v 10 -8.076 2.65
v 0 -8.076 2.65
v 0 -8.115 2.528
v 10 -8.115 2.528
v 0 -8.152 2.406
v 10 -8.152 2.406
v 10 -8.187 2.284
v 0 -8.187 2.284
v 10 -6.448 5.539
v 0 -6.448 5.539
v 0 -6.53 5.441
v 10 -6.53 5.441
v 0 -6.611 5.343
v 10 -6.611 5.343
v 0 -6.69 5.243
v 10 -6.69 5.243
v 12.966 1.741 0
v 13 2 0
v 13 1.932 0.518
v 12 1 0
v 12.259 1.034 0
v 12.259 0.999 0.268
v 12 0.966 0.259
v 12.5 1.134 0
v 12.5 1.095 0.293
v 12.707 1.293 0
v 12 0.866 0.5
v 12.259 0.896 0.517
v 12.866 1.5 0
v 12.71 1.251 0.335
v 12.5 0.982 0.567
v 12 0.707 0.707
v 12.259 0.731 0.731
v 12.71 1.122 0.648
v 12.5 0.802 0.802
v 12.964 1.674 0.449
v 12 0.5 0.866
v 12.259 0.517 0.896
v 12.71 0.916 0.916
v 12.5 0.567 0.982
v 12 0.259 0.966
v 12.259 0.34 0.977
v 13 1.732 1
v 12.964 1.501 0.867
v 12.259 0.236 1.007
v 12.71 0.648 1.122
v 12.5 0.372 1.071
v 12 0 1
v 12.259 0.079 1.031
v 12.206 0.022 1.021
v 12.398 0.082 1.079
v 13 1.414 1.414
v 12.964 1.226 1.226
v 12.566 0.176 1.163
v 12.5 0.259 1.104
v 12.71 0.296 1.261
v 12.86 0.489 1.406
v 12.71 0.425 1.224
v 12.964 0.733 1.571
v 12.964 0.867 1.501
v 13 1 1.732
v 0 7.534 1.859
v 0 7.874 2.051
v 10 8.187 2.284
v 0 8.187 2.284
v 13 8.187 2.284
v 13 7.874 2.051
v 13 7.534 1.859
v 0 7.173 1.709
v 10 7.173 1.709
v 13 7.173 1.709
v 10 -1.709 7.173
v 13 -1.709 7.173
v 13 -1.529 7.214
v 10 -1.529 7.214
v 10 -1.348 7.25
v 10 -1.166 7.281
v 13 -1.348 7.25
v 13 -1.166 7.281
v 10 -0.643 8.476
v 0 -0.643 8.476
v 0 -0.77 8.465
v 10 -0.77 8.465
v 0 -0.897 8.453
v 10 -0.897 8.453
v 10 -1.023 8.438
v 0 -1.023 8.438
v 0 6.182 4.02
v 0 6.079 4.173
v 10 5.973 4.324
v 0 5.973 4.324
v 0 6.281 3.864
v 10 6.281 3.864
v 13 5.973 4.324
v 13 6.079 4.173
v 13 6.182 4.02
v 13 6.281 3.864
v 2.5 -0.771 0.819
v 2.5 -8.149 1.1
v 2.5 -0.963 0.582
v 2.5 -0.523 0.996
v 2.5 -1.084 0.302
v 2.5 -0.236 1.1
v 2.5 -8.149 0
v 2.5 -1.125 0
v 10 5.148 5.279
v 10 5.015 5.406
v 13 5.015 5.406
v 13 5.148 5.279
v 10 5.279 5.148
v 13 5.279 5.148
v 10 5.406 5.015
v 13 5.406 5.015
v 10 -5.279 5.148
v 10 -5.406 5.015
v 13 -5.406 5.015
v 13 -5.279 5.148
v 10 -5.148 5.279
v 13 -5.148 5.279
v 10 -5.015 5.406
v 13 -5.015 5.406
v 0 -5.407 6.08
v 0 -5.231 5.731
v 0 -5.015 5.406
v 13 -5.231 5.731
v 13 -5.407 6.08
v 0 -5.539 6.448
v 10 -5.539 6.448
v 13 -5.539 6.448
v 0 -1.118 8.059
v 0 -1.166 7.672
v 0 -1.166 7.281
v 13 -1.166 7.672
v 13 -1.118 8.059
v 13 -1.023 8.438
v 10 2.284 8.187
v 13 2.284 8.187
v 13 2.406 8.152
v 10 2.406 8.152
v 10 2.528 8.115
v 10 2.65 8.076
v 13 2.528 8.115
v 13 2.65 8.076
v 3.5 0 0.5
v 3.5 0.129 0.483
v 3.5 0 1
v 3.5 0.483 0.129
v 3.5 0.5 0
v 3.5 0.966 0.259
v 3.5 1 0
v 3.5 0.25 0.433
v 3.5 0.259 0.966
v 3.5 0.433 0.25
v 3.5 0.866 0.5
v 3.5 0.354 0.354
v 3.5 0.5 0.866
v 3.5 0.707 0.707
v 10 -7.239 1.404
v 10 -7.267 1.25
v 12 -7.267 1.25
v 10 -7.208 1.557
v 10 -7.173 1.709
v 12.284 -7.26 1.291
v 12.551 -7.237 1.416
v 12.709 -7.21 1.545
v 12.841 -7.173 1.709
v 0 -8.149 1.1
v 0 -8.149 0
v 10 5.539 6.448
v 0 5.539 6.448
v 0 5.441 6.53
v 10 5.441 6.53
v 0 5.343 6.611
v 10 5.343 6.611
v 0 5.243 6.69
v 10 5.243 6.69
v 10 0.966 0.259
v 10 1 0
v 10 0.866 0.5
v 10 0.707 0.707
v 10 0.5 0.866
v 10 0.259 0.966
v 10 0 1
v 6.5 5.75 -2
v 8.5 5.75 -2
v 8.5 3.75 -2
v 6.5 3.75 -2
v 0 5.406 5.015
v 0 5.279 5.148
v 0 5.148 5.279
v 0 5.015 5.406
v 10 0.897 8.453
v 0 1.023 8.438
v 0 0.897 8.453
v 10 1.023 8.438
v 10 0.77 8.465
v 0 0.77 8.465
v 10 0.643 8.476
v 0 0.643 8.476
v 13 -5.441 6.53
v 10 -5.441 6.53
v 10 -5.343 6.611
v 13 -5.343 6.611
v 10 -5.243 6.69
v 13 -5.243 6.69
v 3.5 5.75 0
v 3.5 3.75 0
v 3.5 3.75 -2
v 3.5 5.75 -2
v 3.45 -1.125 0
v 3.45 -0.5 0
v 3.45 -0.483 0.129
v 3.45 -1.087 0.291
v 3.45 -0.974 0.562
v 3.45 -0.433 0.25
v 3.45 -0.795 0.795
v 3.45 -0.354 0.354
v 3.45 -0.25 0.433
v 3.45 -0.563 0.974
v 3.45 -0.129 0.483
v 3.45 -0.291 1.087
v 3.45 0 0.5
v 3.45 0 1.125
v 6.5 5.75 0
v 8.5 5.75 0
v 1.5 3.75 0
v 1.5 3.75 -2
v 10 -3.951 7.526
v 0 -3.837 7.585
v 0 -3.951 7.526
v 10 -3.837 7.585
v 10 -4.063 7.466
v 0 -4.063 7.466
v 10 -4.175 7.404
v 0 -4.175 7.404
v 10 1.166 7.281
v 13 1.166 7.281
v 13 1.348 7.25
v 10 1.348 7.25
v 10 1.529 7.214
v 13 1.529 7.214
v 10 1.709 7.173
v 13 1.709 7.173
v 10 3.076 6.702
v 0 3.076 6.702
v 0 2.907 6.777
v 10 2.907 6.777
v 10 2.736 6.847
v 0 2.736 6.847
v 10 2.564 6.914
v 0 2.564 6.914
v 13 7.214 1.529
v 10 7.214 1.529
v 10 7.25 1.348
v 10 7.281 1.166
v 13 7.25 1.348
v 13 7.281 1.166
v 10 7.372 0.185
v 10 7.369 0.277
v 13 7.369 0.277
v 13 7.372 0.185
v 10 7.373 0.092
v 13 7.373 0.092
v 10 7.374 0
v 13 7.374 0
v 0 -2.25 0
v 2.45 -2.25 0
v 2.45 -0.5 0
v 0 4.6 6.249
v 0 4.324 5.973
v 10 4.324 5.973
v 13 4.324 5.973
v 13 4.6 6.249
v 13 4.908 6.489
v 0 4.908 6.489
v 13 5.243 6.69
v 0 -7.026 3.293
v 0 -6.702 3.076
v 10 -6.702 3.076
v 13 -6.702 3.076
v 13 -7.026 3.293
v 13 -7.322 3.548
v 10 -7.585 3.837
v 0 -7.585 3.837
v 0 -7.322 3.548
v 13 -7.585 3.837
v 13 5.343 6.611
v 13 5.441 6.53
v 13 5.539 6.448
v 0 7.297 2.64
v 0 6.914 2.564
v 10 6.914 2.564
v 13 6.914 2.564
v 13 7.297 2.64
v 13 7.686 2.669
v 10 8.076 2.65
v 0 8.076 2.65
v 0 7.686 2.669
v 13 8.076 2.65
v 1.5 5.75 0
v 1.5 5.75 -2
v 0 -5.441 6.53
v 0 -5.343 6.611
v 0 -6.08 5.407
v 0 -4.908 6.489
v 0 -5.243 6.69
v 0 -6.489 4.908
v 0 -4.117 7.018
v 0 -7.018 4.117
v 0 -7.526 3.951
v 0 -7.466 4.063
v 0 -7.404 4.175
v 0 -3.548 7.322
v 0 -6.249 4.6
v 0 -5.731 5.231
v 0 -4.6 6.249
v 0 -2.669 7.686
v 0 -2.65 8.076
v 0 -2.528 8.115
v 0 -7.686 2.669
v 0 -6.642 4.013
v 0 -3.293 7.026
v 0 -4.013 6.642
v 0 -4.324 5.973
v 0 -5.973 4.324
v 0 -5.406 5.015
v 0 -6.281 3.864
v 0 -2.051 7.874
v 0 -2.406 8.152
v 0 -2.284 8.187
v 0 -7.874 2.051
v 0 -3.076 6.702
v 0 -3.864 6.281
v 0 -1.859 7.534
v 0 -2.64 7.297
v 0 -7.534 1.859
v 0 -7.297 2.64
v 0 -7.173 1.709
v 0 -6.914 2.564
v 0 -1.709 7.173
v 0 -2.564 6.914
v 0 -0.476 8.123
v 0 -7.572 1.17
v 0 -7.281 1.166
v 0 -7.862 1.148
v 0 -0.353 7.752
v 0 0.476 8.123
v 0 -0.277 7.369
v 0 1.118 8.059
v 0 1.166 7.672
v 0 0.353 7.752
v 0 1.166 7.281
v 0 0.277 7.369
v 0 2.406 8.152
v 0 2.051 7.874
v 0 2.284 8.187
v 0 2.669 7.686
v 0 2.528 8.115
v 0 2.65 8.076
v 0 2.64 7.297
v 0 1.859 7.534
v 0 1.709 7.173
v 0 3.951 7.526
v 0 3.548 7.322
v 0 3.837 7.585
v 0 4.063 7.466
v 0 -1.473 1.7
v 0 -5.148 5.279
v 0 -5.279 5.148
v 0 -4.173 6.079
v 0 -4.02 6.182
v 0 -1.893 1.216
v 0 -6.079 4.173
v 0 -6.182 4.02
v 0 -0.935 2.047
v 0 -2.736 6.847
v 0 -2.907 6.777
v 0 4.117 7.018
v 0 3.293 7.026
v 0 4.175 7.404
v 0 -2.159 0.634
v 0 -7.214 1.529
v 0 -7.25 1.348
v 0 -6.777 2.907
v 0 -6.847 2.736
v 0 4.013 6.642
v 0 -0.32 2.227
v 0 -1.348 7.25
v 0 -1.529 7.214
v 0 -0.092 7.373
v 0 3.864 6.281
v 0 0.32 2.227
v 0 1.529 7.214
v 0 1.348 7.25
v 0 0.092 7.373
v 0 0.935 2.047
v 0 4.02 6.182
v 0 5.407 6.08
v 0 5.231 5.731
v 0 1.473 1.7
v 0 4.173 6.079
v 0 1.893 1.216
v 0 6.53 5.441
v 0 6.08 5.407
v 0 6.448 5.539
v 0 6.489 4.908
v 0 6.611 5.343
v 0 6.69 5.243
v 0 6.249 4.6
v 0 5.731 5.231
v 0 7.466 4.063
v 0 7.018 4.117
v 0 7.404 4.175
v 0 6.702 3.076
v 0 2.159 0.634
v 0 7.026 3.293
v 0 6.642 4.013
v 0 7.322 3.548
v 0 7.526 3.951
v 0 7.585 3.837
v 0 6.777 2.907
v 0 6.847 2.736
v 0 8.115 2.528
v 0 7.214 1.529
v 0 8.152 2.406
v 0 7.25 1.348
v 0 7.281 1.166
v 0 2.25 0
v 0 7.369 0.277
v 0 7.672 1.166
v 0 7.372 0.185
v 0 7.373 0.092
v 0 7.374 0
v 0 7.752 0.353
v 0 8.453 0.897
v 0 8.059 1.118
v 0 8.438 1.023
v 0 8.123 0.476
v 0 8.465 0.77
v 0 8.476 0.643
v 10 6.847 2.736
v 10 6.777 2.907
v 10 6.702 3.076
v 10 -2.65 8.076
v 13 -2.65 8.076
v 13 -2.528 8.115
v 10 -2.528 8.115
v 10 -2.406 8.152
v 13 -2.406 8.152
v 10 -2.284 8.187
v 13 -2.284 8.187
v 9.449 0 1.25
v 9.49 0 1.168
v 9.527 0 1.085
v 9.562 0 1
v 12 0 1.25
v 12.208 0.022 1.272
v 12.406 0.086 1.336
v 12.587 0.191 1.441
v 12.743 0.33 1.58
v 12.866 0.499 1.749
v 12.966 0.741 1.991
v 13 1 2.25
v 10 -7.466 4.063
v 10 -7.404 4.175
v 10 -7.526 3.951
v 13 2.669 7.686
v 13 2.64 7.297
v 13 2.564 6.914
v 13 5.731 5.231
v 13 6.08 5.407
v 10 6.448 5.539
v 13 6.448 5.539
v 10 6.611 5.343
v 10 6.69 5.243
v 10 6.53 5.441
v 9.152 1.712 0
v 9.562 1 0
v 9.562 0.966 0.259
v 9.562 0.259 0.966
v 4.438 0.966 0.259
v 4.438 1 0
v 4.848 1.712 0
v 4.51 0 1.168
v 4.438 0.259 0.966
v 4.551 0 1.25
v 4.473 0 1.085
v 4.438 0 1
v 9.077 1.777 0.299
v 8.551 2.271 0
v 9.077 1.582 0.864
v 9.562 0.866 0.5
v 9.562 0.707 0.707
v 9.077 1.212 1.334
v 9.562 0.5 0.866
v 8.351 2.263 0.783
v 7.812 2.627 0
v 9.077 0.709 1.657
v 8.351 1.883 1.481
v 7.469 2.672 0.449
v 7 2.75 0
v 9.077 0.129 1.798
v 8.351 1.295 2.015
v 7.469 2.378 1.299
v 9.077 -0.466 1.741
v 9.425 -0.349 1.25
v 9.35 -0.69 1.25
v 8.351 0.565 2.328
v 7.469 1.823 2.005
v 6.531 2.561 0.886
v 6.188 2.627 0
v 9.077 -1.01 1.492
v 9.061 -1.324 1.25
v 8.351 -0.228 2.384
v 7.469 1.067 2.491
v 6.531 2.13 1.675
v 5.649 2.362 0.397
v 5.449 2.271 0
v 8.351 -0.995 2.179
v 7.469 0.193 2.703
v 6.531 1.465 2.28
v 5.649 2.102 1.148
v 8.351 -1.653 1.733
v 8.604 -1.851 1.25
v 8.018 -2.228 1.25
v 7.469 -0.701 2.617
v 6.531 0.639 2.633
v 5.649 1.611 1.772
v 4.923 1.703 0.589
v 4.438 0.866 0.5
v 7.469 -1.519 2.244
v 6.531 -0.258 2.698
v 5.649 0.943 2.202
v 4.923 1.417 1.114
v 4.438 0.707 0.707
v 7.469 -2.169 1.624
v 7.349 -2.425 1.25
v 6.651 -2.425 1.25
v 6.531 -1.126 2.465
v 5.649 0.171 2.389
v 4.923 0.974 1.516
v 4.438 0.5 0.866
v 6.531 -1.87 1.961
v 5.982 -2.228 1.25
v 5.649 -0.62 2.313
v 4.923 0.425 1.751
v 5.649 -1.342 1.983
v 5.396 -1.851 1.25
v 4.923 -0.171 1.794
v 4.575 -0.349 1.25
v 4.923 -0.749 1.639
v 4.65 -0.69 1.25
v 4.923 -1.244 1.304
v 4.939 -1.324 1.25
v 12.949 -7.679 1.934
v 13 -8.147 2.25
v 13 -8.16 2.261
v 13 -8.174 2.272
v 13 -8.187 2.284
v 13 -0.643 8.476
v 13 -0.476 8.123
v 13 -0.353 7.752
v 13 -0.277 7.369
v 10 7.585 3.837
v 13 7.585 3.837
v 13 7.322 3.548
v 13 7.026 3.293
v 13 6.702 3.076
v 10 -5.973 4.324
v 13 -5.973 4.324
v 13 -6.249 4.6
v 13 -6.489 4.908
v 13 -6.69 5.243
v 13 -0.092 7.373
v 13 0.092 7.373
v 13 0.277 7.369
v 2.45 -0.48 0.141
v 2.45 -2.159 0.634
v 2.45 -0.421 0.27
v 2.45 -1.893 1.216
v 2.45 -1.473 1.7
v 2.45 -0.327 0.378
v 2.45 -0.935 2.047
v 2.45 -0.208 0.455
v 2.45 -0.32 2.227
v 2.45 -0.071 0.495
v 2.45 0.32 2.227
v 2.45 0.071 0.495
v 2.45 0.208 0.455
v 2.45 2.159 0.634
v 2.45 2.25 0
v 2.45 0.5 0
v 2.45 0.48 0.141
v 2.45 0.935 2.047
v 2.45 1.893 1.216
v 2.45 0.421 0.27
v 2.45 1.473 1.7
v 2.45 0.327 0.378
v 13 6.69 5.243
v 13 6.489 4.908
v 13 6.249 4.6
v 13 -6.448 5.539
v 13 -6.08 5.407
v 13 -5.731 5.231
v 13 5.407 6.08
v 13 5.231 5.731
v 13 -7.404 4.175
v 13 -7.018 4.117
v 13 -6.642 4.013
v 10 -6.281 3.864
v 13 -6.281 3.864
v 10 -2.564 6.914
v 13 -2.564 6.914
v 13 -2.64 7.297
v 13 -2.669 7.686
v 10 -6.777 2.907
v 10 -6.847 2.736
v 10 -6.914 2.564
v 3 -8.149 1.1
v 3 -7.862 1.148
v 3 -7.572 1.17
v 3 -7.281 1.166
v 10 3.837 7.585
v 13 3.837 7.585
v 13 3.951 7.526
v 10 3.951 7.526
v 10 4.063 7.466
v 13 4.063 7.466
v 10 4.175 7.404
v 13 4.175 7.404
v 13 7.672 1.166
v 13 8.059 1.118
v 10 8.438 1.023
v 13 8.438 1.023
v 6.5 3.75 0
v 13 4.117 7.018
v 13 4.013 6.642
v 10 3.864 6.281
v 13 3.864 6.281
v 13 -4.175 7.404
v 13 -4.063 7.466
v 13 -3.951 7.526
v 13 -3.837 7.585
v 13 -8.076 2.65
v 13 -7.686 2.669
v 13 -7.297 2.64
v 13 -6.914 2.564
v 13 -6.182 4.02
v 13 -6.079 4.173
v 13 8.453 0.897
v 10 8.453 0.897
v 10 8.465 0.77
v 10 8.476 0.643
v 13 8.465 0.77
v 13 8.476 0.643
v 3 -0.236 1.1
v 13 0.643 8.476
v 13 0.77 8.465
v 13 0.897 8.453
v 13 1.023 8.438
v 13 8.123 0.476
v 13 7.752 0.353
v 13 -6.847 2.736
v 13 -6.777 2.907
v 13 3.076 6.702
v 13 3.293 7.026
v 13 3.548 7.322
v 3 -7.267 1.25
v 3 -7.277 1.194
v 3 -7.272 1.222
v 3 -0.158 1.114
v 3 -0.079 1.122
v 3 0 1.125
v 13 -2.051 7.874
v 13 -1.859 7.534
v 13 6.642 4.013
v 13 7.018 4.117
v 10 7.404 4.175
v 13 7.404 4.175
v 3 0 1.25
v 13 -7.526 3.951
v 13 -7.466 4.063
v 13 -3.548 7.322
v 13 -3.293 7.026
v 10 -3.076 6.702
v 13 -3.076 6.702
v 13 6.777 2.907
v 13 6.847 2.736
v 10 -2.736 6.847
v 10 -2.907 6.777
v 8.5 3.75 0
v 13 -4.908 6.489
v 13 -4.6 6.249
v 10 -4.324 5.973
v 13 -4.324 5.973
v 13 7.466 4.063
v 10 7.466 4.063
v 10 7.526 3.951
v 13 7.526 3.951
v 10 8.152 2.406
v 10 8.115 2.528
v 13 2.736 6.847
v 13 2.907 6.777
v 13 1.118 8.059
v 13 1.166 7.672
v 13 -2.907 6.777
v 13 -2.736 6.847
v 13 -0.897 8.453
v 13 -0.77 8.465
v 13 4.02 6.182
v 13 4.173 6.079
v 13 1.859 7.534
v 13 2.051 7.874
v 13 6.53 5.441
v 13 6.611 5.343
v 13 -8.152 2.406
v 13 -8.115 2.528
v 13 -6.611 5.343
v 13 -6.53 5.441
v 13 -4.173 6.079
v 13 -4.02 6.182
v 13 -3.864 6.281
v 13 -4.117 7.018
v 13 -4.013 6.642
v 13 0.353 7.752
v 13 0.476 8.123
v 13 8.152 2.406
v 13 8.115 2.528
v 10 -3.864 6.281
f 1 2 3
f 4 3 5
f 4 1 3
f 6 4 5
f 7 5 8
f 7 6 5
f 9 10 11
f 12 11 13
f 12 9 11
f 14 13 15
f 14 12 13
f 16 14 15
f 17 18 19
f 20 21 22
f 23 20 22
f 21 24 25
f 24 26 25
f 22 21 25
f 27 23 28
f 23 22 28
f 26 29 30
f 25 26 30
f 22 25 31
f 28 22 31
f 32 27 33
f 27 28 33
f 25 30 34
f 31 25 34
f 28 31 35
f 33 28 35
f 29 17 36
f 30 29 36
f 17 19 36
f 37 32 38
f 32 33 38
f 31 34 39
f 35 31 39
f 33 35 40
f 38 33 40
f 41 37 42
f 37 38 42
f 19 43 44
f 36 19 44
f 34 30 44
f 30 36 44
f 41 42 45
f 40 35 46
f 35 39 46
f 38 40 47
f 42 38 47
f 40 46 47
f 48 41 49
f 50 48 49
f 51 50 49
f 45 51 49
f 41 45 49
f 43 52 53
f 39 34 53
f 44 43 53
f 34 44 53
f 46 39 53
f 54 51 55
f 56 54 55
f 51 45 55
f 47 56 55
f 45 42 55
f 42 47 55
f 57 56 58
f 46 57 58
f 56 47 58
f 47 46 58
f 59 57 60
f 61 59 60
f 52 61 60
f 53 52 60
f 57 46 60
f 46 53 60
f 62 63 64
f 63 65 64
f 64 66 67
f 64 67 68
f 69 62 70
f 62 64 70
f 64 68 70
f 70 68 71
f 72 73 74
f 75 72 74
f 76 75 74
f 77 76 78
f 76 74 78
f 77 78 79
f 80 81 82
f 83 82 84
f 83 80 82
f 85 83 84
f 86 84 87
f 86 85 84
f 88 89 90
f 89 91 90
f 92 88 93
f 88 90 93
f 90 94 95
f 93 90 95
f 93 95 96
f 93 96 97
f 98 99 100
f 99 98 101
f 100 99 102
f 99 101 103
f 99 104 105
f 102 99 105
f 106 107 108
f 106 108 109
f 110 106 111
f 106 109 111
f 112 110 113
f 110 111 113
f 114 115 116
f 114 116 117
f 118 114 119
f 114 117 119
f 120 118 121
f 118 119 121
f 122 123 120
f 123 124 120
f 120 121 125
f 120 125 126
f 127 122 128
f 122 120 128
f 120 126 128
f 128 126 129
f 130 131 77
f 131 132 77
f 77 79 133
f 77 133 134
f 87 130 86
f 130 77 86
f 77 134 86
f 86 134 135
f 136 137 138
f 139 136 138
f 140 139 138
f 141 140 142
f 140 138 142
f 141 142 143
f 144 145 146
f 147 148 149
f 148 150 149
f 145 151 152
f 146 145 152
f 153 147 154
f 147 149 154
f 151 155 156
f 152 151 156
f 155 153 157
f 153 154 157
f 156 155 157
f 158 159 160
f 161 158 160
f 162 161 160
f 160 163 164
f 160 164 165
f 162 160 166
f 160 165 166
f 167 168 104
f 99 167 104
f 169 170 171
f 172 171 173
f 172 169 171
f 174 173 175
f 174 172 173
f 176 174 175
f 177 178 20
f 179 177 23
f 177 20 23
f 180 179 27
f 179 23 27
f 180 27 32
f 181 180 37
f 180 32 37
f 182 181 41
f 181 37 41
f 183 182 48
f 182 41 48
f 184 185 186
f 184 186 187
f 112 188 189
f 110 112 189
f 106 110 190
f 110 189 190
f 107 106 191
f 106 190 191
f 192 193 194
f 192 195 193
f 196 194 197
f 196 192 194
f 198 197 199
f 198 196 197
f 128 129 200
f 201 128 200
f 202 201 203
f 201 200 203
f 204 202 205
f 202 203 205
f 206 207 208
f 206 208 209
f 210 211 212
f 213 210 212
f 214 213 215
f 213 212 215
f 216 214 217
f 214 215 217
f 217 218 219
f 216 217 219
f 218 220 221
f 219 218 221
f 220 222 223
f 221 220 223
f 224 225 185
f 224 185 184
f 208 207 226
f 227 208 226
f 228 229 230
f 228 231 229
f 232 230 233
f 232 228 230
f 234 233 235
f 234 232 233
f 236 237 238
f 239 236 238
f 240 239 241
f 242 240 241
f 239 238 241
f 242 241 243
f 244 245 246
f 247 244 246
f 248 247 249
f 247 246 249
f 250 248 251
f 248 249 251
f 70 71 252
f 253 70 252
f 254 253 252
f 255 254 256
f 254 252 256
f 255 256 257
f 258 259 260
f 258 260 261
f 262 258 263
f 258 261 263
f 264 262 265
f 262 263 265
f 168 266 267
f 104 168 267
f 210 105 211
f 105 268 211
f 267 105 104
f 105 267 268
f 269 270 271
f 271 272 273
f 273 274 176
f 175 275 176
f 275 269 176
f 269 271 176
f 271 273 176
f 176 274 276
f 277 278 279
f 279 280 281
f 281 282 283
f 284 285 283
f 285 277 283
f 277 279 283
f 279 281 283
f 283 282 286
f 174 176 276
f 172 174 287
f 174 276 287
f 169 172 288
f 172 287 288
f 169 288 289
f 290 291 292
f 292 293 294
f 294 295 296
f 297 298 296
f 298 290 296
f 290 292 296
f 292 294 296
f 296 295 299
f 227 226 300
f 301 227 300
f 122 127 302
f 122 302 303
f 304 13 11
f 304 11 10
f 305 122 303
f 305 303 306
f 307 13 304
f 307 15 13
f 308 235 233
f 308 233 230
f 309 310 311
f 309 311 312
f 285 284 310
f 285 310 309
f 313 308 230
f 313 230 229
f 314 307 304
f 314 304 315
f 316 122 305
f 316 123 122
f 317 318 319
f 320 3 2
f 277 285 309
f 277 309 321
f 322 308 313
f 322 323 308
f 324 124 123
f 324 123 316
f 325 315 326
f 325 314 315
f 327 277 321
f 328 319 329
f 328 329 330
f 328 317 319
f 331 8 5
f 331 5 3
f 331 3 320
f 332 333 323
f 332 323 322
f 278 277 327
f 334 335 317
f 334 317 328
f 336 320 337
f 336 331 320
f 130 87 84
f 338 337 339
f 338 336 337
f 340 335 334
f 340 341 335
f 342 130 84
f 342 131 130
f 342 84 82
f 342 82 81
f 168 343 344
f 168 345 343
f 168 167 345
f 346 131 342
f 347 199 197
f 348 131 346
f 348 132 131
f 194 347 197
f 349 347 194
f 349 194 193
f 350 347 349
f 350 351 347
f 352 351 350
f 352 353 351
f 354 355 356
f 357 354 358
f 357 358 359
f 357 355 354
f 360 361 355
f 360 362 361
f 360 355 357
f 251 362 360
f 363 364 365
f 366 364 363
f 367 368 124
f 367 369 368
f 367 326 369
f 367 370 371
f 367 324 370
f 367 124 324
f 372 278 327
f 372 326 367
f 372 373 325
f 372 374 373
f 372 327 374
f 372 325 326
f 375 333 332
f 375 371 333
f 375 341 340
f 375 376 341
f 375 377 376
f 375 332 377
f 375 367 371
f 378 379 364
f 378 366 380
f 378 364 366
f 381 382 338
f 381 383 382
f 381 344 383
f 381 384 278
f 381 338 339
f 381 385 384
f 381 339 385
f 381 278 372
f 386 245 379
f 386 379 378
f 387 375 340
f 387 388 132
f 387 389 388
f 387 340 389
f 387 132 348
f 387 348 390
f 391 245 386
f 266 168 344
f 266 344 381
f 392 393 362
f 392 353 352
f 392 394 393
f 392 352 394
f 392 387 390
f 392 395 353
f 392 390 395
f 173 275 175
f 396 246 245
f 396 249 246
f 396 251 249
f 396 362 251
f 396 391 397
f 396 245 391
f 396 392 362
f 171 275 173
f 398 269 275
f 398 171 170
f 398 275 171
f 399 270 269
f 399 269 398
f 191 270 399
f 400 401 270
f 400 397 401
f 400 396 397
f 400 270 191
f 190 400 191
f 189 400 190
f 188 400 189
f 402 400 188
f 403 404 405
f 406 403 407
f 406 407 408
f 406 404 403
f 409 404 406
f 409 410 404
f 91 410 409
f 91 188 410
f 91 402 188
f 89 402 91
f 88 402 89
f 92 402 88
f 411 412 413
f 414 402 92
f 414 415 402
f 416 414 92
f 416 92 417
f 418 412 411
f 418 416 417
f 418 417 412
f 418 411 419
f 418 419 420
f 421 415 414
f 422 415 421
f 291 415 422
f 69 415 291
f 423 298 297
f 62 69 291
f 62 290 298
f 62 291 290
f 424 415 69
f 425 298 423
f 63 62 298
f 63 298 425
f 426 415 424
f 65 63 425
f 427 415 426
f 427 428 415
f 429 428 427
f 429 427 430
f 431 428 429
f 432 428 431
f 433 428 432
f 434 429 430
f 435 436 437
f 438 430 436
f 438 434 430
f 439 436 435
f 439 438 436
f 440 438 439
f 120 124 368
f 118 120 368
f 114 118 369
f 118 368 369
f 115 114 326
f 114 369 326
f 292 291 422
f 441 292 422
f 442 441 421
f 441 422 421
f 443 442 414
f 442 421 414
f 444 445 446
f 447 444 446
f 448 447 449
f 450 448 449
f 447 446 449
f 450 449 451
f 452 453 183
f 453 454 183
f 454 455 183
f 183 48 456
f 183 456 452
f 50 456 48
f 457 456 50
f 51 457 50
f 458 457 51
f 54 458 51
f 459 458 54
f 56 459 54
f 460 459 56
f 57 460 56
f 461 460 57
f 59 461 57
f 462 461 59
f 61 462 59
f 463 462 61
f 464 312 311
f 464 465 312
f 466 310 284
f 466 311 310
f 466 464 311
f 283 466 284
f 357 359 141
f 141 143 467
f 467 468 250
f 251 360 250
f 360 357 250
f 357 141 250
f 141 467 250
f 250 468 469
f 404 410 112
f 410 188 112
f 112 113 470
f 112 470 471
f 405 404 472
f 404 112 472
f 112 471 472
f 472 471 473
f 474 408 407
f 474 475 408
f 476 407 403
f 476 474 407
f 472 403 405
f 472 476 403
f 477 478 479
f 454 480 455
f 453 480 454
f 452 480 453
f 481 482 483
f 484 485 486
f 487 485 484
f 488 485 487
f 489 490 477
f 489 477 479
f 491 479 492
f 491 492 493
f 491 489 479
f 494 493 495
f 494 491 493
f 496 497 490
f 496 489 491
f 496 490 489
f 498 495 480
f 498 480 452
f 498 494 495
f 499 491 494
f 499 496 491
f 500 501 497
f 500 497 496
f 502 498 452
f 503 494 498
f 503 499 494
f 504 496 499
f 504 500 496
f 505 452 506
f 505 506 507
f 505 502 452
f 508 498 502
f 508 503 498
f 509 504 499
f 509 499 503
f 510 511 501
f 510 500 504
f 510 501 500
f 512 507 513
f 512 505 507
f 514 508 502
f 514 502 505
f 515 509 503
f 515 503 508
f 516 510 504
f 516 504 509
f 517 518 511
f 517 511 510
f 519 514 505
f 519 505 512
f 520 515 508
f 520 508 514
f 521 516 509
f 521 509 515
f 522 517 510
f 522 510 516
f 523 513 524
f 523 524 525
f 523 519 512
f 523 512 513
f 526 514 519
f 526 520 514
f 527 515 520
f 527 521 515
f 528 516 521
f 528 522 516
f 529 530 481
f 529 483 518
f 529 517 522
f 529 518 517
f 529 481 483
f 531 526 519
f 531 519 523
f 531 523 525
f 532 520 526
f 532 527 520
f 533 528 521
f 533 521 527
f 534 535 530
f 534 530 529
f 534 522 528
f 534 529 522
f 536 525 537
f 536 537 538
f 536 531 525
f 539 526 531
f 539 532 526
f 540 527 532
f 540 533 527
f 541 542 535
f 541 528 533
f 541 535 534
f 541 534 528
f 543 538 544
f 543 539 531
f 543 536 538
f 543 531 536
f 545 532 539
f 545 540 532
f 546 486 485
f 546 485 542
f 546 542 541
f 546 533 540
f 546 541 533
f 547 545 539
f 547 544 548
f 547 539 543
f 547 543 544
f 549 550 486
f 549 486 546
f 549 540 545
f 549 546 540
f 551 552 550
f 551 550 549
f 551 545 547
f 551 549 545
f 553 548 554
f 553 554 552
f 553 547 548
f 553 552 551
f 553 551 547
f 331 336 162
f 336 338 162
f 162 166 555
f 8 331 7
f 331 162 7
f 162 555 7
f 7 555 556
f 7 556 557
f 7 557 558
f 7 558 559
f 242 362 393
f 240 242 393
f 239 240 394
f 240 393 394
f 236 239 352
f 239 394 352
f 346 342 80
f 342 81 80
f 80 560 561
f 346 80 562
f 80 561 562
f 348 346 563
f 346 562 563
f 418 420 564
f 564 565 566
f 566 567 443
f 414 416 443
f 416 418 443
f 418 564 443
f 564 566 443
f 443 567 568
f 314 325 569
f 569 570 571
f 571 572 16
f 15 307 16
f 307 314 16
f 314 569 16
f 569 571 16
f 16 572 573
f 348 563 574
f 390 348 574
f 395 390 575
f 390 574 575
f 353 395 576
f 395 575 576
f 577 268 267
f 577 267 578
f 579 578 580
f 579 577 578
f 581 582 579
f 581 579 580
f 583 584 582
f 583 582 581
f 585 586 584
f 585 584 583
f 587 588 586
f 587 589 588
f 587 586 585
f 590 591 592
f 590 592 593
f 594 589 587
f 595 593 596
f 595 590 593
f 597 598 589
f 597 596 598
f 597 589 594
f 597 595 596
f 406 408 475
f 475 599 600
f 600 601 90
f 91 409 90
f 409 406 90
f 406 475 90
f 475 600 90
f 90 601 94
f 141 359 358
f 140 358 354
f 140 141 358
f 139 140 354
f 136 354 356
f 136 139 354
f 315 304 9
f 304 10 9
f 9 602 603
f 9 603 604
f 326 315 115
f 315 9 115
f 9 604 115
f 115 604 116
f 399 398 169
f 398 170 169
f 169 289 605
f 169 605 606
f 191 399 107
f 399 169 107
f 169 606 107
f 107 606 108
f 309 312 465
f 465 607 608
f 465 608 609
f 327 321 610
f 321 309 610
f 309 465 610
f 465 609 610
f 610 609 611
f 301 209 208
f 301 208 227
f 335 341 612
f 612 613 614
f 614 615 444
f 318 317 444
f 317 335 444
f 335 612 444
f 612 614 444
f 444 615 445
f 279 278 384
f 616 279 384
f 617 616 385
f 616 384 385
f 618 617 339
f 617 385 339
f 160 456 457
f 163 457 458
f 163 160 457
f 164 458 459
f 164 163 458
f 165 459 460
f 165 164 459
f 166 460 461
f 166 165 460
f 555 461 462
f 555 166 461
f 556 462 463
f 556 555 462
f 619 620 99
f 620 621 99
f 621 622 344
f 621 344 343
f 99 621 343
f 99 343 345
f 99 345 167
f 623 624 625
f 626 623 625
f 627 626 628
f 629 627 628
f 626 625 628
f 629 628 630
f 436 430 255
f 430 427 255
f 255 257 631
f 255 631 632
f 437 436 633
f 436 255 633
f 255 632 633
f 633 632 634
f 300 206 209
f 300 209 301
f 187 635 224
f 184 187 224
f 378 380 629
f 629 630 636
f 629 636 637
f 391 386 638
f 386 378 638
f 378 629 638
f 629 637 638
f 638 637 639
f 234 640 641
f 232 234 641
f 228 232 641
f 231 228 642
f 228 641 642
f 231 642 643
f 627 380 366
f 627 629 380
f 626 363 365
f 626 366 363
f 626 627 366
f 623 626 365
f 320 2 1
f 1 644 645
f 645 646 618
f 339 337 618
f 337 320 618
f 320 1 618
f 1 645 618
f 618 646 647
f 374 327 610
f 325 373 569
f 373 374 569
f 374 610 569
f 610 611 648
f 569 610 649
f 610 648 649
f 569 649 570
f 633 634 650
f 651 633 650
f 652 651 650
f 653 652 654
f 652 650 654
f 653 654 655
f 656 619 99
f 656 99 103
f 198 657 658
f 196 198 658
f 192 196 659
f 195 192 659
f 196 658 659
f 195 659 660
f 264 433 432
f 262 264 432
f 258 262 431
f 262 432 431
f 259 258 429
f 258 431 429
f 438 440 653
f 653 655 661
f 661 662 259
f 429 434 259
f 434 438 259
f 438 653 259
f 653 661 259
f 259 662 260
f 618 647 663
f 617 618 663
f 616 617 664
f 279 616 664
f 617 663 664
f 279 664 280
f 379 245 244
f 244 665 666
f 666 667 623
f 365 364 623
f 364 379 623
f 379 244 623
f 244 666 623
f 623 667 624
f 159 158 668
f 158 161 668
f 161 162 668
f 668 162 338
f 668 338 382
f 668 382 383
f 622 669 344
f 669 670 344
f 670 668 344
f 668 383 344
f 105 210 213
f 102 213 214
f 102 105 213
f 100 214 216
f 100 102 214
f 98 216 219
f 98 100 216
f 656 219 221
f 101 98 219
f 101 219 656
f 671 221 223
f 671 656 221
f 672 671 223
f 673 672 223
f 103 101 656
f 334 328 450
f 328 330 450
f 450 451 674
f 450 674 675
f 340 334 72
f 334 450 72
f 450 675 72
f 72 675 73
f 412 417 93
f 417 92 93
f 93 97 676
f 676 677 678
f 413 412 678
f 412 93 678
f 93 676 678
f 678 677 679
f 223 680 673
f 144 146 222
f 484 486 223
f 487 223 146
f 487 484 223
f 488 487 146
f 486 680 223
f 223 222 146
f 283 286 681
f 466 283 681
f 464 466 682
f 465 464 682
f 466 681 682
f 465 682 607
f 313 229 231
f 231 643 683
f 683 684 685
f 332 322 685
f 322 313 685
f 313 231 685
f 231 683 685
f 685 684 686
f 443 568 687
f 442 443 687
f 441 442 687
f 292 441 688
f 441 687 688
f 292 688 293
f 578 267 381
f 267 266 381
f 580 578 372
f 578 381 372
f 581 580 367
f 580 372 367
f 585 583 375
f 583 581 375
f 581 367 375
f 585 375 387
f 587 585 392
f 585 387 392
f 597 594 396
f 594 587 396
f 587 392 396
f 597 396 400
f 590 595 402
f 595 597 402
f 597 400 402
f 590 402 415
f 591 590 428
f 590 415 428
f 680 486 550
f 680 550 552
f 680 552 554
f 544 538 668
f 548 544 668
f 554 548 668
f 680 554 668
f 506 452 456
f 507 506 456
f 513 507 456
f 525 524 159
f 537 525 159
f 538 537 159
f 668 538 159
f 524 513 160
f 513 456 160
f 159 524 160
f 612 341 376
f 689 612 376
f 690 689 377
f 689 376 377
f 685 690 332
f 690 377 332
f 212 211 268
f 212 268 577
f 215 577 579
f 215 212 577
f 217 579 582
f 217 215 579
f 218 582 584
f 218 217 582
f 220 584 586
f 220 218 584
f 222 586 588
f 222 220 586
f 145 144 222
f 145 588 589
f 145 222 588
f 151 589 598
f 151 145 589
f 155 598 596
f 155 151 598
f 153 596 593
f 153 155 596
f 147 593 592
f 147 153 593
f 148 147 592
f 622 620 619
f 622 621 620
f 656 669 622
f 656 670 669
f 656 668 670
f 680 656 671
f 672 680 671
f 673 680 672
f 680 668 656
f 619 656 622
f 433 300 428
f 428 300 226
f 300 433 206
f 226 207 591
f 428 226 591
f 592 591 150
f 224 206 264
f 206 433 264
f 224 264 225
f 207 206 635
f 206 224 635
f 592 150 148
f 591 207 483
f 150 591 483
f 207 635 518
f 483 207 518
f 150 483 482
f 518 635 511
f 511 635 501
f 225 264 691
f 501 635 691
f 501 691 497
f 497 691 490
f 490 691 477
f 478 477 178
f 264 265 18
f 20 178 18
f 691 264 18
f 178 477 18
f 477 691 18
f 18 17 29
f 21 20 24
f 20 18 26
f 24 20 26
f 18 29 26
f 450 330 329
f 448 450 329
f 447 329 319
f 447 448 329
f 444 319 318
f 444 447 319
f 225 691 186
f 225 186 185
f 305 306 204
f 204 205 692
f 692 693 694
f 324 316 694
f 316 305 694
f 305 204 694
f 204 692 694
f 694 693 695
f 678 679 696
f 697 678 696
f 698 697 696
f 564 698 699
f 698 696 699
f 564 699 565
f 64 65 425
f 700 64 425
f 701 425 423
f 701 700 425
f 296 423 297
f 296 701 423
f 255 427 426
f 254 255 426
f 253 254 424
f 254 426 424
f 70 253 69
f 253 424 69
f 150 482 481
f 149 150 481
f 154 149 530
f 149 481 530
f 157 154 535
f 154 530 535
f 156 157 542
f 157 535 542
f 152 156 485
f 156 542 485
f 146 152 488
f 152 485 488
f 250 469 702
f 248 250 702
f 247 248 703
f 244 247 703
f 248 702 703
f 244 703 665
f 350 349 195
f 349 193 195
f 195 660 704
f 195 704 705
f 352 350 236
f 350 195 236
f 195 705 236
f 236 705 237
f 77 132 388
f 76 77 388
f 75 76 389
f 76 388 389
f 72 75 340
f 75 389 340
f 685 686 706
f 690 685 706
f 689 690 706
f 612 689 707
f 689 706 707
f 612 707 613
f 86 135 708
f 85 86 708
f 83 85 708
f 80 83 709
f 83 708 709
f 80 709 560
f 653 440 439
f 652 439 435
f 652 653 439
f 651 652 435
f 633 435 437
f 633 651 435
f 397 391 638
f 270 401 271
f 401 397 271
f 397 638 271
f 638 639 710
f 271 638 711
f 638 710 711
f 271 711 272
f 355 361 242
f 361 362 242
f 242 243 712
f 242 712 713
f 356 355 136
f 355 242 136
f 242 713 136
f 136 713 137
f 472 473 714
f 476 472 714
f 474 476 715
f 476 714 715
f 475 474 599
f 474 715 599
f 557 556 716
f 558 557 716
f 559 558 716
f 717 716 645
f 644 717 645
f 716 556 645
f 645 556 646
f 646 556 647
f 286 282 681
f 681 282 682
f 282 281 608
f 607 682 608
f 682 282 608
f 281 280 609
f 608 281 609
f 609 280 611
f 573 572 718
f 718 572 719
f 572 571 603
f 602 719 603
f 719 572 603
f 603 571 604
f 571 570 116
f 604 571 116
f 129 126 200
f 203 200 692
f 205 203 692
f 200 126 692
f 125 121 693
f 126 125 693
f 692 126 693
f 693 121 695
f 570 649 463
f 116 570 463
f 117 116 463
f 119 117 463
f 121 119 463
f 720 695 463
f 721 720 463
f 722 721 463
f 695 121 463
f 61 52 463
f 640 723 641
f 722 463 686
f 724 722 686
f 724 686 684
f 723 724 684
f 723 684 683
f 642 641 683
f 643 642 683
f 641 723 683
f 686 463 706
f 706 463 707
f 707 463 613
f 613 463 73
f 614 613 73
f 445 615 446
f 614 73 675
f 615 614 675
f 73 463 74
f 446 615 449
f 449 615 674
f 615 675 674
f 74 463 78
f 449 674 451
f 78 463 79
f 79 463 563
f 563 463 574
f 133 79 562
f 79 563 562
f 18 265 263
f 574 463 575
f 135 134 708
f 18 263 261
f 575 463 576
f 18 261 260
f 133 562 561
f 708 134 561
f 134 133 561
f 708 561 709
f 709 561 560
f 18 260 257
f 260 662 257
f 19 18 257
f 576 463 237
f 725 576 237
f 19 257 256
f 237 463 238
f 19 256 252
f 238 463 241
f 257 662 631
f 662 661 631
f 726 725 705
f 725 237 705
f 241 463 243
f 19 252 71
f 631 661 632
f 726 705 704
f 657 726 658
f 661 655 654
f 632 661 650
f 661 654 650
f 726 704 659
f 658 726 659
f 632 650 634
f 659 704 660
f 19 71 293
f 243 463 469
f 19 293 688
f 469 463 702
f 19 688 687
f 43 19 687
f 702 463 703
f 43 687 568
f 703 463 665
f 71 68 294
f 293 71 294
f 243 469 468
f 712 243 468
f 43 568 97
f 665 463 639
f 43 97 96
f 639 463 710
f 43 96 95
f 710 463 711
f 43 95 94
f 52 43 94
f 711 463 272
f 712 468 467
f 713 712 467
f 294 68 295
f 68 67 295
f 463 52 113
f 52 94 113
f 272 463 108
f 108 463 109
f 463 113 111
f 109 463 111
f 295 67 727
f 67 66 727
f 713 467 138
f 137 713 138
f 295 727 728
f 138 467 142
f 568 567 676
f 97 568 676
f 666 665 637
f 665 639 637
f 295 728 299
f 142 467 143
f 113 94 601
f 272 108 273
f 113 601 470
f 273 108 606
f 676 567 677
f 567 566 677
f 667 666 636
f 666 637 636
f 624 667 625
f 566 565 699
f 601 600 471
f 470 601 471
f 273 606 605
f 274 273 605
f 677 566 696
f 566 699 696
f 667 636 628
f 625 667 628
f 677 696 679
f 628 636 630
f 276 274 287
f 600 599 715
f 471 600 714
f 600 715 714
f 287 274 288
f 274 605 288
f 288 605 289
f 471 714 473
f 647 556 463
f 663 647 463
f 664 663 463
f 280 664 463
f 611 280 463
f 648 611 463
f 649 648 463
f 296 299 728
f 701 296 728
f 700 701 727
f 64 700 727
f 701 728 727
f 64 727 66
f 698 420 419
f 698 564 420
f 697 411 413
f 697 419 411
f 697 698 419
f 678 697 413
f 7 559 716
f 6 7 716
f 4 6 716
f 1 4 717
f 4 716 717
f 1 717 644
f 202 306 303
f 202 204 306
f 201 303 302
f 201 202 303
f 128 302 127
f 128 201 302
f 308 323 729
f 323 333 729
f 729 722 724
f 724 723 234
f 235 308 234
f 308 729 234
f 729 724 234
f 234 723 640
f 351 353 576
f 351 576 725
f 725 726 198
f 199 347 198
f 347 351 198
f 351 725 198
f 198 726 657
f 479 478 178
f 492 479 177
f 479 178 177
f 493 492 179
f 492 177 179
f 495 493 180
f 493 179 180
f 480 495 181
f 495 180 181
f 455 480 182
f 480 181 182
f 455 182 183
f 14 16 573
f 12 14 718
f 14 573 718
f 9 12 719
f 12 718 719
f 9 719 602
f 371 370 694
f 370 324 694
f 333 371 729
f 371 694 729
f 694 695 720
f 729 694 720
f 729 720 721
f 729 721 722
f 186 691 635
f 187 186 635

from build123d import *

# Parameters (mm, degrees)
BASPROSKE_W              = 10
BASPROSKE_H              = 8.5
TOOTHCUT_DEPTH           = 16.636495771
TEETHCUTS_COUNT          = 32
TEETHCUTS_ANGLE          = 348.75
BORSKE_R                 = 1
BORE_DEPTH               = 50.0000508
SKETCH1_W                = 2.2
SKETCH1_H                = 12
CUT_EXTRUDE1_DEPTH       = 16.610070769
BOSS_EXTRUDE1_DEPTH      = 0.5
BOSS_EXTRUDE1_DEPTH_BACK = 0.5
SKETCH4_R                = 1.125
SKETCH4_R_2              = 0.5
BOSS_EXTRUDE2_REACH      = 18.234
SKETCH5_W                = 2.5
SKETCH5_H                = 8.148803967
SKETCH6_R                = 2.25
CUT_EXTRUDE4_DEPTH       = 2.45
SKETCH7_R                = 0.5
CUT_EXTRUDE5_DEPTH       = 2.4
SKETCH8_W                = 11
SKETCH8_H                = 18
CUT_EXTRUDE6_DEPTH       = 10
SKETCH9_W                = 2
SKETCH9_H                = 2
BOSS_EXTRUDE3_DEPTH      = 2
SKETCH10_W               = 1.25
SKETCH10_H               = 9
CUT_EXTRUDE7_DEPTH       = 7
BOSS_EXTRUDE4_REACH      = 18.961
SKETCH12_R               = 1.125
SKETCH12_R_2             = 0.5
BOSS_EXTRUDE5_DEPTH      = 1
SKETCH13_W               = 1.7
SKETCH13_H               = 4
CUT_EXTRUDE8_DEPTH       = 17.960964283
BOSS_EXTRUDE6_DEPTH      = 1.25
FILLET1_R                = 1


with BuildPart() as part:
    # BasProSke → Base-Revolve (revolve)
    with BuildSketch(Plane(origin=(0, 0, 0), x_dir=(1, 0, 0), z_dir=(0, 1, 0)), mode=Mode.PRIVATE) as base_revolve_sk:
        with Locations((5, 4.25)):
            Rectangle(BASPROSKE_W, BASPROSKE_H)
    revolve(base_revolve_sk.sketch.rotate(Axis((-10, 0, 0), (1, 0, 0)), 180), axis=Axis((-10, 0, 0), (1, 0, 0)))

    # TooCutSke → ToothCut (cut, through all)
    with BuildSketch(Plane(origin=(0, 0, 0), x_dir=(0, 0, -1), z_dir=(1, 0, 0))):
        with BuildLine():
            ThreePointArc((0.277002447, 7.3687954), (0, 7.374), (-0.277002447, 7.3687954))
            ThreePointArc((-0.277002447, 7.3687954), (-0.41335061, 7.952280695), (-0.656086882, 8.500117362))
            ThreePointArc((-0.656086882, 8.500117362), (0, 8.5254), (0.656086882, 8.500117362))
            ThreePointArc((0.656086882, 8.500117362), (0.41335061, 7.952280695), (0.277002447, 7.3687954))
        make_face()
    toothcut = extrude(amount=TOOTHCUT_DEPTH, mode=Mode.SUBTRACT)

    # TeethCuts: ToothCut ×32 about axis
    teethcuts_axis = Axis((-10, 0, 0), (1, 0, 0))
    for i in range(1, TEETHCUTS_COUNT):
        add(toothcut.rotate(teethcuts_axis, i * TEETHCUTS_ANGLE / (TEETHCUTS_COUNT - 1)), mode=Mode.SUBTRACT)

    # BorSke → Bore (cut, symmetric)
    with BuildSketch(Plane(origin=(0, 0, 0), x_dir=(0, 0, -1), z_dir=(1, 0, 0))):
        with Locations(Location((0, 0, 0), (0, 0, 180))):
            Circle(BORSKE_R)
    extrude(amount=BORE_DEPTH, both=True, mode=Mode.SUBTRACT)

    # Sketch1 → Cut-Extrude1 (cut, through all)
    with BuildSketch(Plane(origin=(10, 0, 0), x_dir=(0, 0, -1), z_dir=(1, 0, 0))):
        with Locations((0, -6)):
            Rectangle(SKETCH1_W, SKETCH1_H)
    extrude(amount=-CUT_EXTRUDE1_DEPTH, mode=Mode.SUBTRACT)

    # Sketch2 → Cut-Revolve1 (revolve, cut)
    with BuildSketch(Plane.XY):
        with BuildLine():
            Line((4.25, 0), (9.75, 0))
            ThreePointArc((9.75, 0), (7, 2.75), (4.25, 0))
        make_face()
    revolve(axis=Axis((4.25, 0, 0), (1, 0, 0)), mode=Mode.SUBTRACT)

    # Sketch4 → Boss-Extrude1 (add, two sides: drawn at the far end of the back side and taken through both)
    with BuildSketch(Plane.ZY.offset(-3).offset(-BOSS_EXTRUDE1_DEPTH_BACK)):
        Circle(SKETCH4_R)
        Circle(SKETCH4_R_2, mode=Mode.SUBTRACT)
    extrude(amount=BOSS_EXTRUDE1_DEPTH + BOSS_EXTRUDE1_DEPTH_BACK)

    # Sketch5 → Boss-Extrude2 (add, up to next)
    with BuildSketch(Plane.XY.offset(-1.1), mode=Mode.PRIVATE) as boss_extrude2_sk1:
        with Locations((1.25, -4.074401984)):
            Rectangle(SKETCH5_W, SKETCH5_H)
    boss_extrude2_tool1 = extrude(boss_extrude2_sk1.sketch, amount=BOSS_EXTRUDE2_REACH, mode=Mode.PRIVATE) - part.part
    add(boss_extrude2_tool1.solids().sort_by_distance((1.25, -4.074402, -1.1))[0])

    # Sketch6 → Cut-Extrude4 (cut)
    with BuildSketch(Plane.ZY):
        Circle(SKETCH6_R)
    extrude(amount=-CUT_EXTRUDE4_DEPTH, mode=Mode.SUBTRACT)

    # Sketch7 → Cut-Extrude5 (cut)
    with BuildSketch(Plane(origin=(2.5, 0, 0), x_dir=(0, 0, -1), z_dir=(1, 0, 0))):
        with Locations(Location((0, 0, 0), (0, 0, 180))):
            Circle(SKETCH7_R)
    extrude(amount=-CUT_EXTRUDE5_DEPTH, mode=Mode.SUBTRACT)

    # Sketch8 → Cut-Extrude6 (cut)
    with BuildSketch(Plane.XY):
        with Locations((5, 0)):
            Rectangle(SKETCH8_W, SKETCH8_H)
    extrude(amount=-CUT_EXTRUDE6_DEPTH, mode=Mode.SUBTRACT)

    # Sketch9 → Boss-Extrude3 (add)
    with BuildSketch(Plane(origin=(0, 0, 0), x_dir=(-1, 0, 0), z_dir=(0, 0, -1))):
        with Locations((-7.5, 4.75)):
            Rectangle(SKETCH9_W, SKETCH9_H)
        with Locations((-2.5, 4.75)):
            Rectangle(SKETCH9_W, SKETCH9_H)
    extrude(amount=BOSS_EXTRUDE3_DEPTH)

    # Sketch10 → Cut-Extrude7 (cut)
    with BuildSketch(Plane(origin=(10, 0, 0), x_dir=(0, 0, -1), z_dir=(1, 0, 0))):
        with Locations((-0.625, -4.5)):
            Rectangle(SKETCH10_W, SKETCH10_H)
    extrude(amount=-CUT_EXTRUDE7_DEPTH, mode=Mode.SUBTRACT)

    # Sketch11 → Boss-Extrude4 (add, up to next)
    with BuildSketch(Plane(origin=(12, 0, 0), x_dir=(0, 0, -1), z_dir=(1, 0, 0)), mode=Mode.PRIVATE) as boss_extrude4_sk1:
        with BuildLine():
            Line((-1.25, 0), (-1.25, -7.267281197))
            ThreePointArc((-1.25, -7.267281197), (-1.480378414, -7.223874013), (-1.70926059, -7.173165566))
            ThreePointArc((-1.70926059, -7.173165566), (-1.949908855, -7.706695879), (-2.283707519, -8.187470914))
            ThreePointArc((-2.283707519, -8.187470914), (-2.467419757, -8.133992854), (-2.649881718, -8.076393185))
            ThreePointArc((-2.649881718, -8.076393185), (-2.660320865, -7.491194752), (-2.563999025, -6.913883496))
            ThreePointArc((-2.563999025, -6.913883496), (-2.82190763, -6.812687673), (-3.075832807, -6.701875002))
            ThreePointArc((-3.075832807, -6.701875002), (-3.415943684, -7.178205532), (-3.837123056, -7.584621721))
            ThreePointArc((-3.837123056, -7.584621721), (-4.006872263, -7.496330747), (-4.174591131, -7.404241277))
            ThreePointArc((-4.174591131, -7.404241277), (-4.070663142, -6.828250691), (-3.86356426, -6.280823768))
            ThreePointArc((-3.86356426, -6.280823768), (-4.096774898, -6.131256921), (-4.324202495, -5.97303514))
            ThreePointArc((-4.324202495, -5.97303514), (-4.750705713, -6.373860772), (-5.243080107, -6.690299769))
            ThreePointArc((-5.243080107, -6.690299769), (-5.392342915, -6.570588854), (-5.538873348, -6.447548529))
            ThreePointArc((-5.538873348, -6.447548529), (-5.324572118, -5.902900785), (-5.014654888, -5.406395505))
            ThreePointArc((-5.014654888, -5.406395505), (-5.214205404, -5.214205404), (-5.406395505, -5.014654888))
            ThreePointArc((-5.406395505, -5.014654888), (-5.902900785, -5.324572118), (-6.447548529, -5.538873348))
            ThreePointArc((-6.447548529, -5.538873348), (-6.570588854, -5.392342915), (-6.690299769, -5.243080107))
            ThreePointArc((-6.690299769, -5.243080107), (-6.373860772, -4.750705713), (-5.97303514, -4.324202495))
            ThreePointArc((-5.97303514, -4.324202495), (-6.131256921, -4.096774898), (-6.280823768, -3.86356426))
            ThreePointArc((-6.280823768, -3.86356426), (-6.828250691, -4.070663142), (-7.404241277, -4.174591131))
            ThreePointArc((-7.404241277, -4.174591131), (-7.496330747, -4.006872263), (-7.584621721, -3.837123056))
            ThreePointArc((-7.584621721, -3.837123056), (-7.178205532, -3.415943684), (-6.701875002, -3.075832807))
            ThreePointArc((-6.701875002, -3.075832807), (-6.812687673, -2.82190763), (-6.913883496, -2.563999025))
            ThreePointArc((-6.913883496, -2.563999025), (-7.491194752, -2.660320865), (-8.076393185, -2.649881718))
            ThreePointArc((-8.076393185, -2.649881718), (-8.133992854, -2.467419757), (-8.187470914, -2.283707519))
            ThreePointArc((-8.187470914, -2.283707519), (-7.706695879, -1.949908855), (-7.173165566, -1.70926059))
            ThreePointArc((-7.173165566, -1.70926059), (-7.232310658, -1.438596035), (-7.281246559, -1.165900745))
            ThreePointArc((-7.281246559, -1.165900745), (-7.866256399, -1.14774395), (-8.438173832, -1.023338837))
            ThreePointArc((-8.438173832, -1.023338837), (-8.459070177, -0.833145693), (-8.475680191, -0.642530382))
            ThreePointArc((-8.475680191, -0.642530382), (-7.939022225, -0.408940123), (-7.3687954, -0.277002447))
            ThreePointArc((-7.3687954, -0.277002447), (-7.374, 0), (-7.3687954, 0.277002447))
            ThreePointArc((-7.3687954, 0.277002447), (-7.939022225, 0.408940123), (-8.475680191, 0.642530382))
            ThreePointArc((-8.475680191, 0.642530382), (-8.459070177, 0.833145693), (-8.438173832, 1.023338837))
            ThreePointArc((-8.438173832, 1.023338837), (-7.866256399, 1.14774395), (-7.281246559, 1.165900745))
            ThreePointArc((-7.281246559, 1.165900745), (-7.232310658, 1.438596035), (-7.173165566, 1.70926059))
            ThreePointArc((-7.173165566, 1.70926059), (-7.706695879, 1.949908855), (-8.187470914, 2.283707519))
            ThreePointArc((-8.187470914, 2.283707519), (-8.133992854, 2.467419757), (-8.076393185, 2.649881718))
            ThreePointArc((-8.076393185, 2.649881718), (-7.491194752, 2.660320865), (-6.913883496, 2.563999025))
            ThreePointArc((-6.913883496, 2.563999025), (-6.812687673, 2.82190763), (-6.701875002, 3.075832807))
            ThreePointArc((-6.701875002, 3.075832807), (-7.178205532, 3.415943684), (-7.584621721, 3.837123056))
            ThreePointArc((-7.584621721, 3.837123056), (-7.496330747, 4.006872263), (-7.404241277, 4.174591131))
            ThreePointArc((-7.404241277, 4.174591131), (-6.828250691, 4.070663142), (-6.280823768, 3.86356426))
            ThreePointArc((-6.280823768, 3.86356426), (-6.131256921, 4.096774898), (-5.97303514, 4.324202495))
            ThreePointArc((-5.97303514, 4.324202495), (-6.373860772, 4.750705713), (-6.690299769, 5.243080107))
            ThreePointArc((-6.690299769, 5.243080107), (-6.570588854, 5.392342915), (-6.447548529, 5.538873348))
            ThreePointArc((-6.447548529, 5.538873348), (-5.902900785, 5.324572118), (-5.406395505, 5.014654888))
            ThreePointArc((-5.406395505, 5.014654888), (-5.214205404, 5.214205404), (-5.014654888, 5.406395505))
            ThreePointArc((-5.014654888, 5.406395505), (-5.324572118, 5.902900785), (-5.538873348, 6.447548529))
            ThreePointArc((-5.538873348, 6.447548529), (-5.392342915, 6.570588854), (-5.243080107, 6.690299769))
            ThreePointArc((-5.243080107, 6.690299769), (-4.750705713, 6.373860772), (-4.324202495, 5.97303514))
            ThreePointArc((-4.324202495, 5.97303514), (-4.096774898, 6.131256921), (-3.86356426, 6.280823768))
            ThreePointArc((-3.86356426, 6.280823768), (-4.070663142, 6.828250691), (-4.174591131, 7.404241277))
            ThreePointArc((-4.174591131, 7.404241277), (-4.006872263, 7.496330747), (-3.837123056, 7.584621721))
            ThreePointArc((-3.837123056, 7.584621721), (-3.415943684, 7.178205532), (-3.075832807, 6.701875002))
            ThreePointArc((-3.075832807, 6.701875002), (-2.82190763, 6.812687673), (-2.563999025, 6.913883496))
            ThreePointArc((-2.563999025, 6.913883496), (-2.660320865, 7.491194752), (-2.649881718, 8.076393185))
            ThreePointArc((-2.649881718, 8.076393185), (-2.467419757, 8.133992854), (-2.283707519, 8.187470914))
            ThreePointArc((-2.283707519, 8.187470914), (-1.949908855, 7.706695879), (-1.70926059, 7.173165566))
            ThreePointArc((-1.70926059, 7.173165566), (-1.438596035, 7.232310658), (-1.165900745, 7.281246559))
            ThreePointArc((-1.165900745, 7.281246559), (-1.14774395, 7.866256399), (-1.023338837, 8.438173832))
            ThreePointArc((-1.023338837, 8.438173832), (-0.833145693, 8.459070177), (-0.642530382, 8.475680191))
            ThreePointArc((-0.642530382, 8.475680191), (-0.408940123, 7.939022225), (-0.277002447, 7.3687954))
            ThreePointArc((-0.277002447, 7.3687954), (-0.138525669, 7.372698735), (0, 7.374))
            Line((0, 7.374), (0, 1))
            ThreePointArc((0, 1), (-0.707106781, 0.707106781), (-1, 0))
            Line((-1, 0), (-1.25, 0))
        make_face()
    boss_extrude4_tool1 = extrude(boss_extrude4_sk1.sketch, amount=-BOSS_EXTRUDE4_REACH, mode=Mode.PRIVATE) - part.part
    add(boss_extrude4_tool1.solids().sort_by_distance((12, 0.4527, 3.714882))[0])

    # Sketch12 → Boss-Extrude5 (add)
    with BuildSketch(Plane.ZY.offset(-2.45)):
        Circle(SKETCH12_R)
        Circle(SKETCH12_R_2, mode=Mode.SUBTRACT)
    extrude(amount=-BOSS_EXTRUDE5_DEPTH)

    # Sketch13 → Cut-Extrude8 (cut, through all)
    with BuildSketch(Plane(origin=(0, 0, 0), x_dir=(-1, 0, 0), z_dir=(0, 0, -1))):
        with Locations((-2.808045716, 0.106885372)):
            Rectangle(SKETCH13_W, SKETCH13_H)
    extrude(amount=CUT_EXTRUDE8_DEPTH, mode=Mode.SUBTRACT)

    # Sketch14 → Boss-Extrude6 (add)
    with BuildSketch(Plane(origin=(13, 0, 0), x_dir=(0, 0, -1), z_dir=(1, 0, 0))):
        with BuildLine():
            Line((-1.25, 0), (-1.25, -7.267281197))
            ThreePointArc((-1.25, -7.267281197), (-1.480378414, -7.223874013), (-1.70926059, -7.173165566))
            ThreePointArc((-1.70926059, -7.173165566), (-1.949908855, -7.706695879), (-2.283707519, -8.187470914))
            ThreePointArc((-2.283707519, -8.187470914), (-2.467419757, -8.133992854), (-2.649881718, -8.076393185))
            ThreePointArc((-2.649881718, -8.076393185), (-2.660320865, -7.491194752), (-2.563999025, -6.913883496))
            ThreePointArc((-2.563999025, -6.913883496), (-2.82190763, -6.812687673), (-3.075832807, -6.701875002))
            ThreePointArc((-3.075832807, -6.701875002), (-3.415943684, -7.178205532), (-3.837123056, -7.584621721))
            ThreePointArc((-3.837123056, -7.584621721), (-4.006872263, -7.496330747), (-4.174591131, -7.404241277))
            ThreePointArc((-4.174591131, -7.404241277), (-4.070663142, -6.828250691), (-3.86356426, -6.280823768))
            ThreePointArc((-3.86356426, -6.280823768), (-4.096774898, -6.131256921), (-4.324202495, -5.97303514))
            ThreePointArc((-4.324202495, -5.97303514), (-4.750705713, -6.373860772), (-5.243080107, -6.690299769))
            ThreePointArc((-5.243080107, -6.690299769), (-5.392342915, -6.570588854), (-5.538873348, -6.447548529))
            ThreePointArc((-5.538873348, -6.447548529), (-5.324572118, -5.902900785), (-5.014654888, -5.406395505))
            ThreePointArc((-5.014654888, -5.406395505), (-5.214205404, -5.214205404), (-5.406395505, -5.014654888))
            ThreePointArc((-5.406395505, -5.014654888), (-5.902900785, -5.324572118), (-6.447548529, -5.538873348))
            ThreePointArc((-6.447548529, -5.538873348), (-6.570588854, -5.392342915), (-6.690299769, -5.243080107))
            ThreePointArc((-6.690299769, -5.243080107), (-6.373860772, -4.750705713), (-5.97303514, -4.324202495))
            ThreePointArc((-5.97303514, -4.324202495), (-6.131256921, -4.096774898), (-6.280823768, -3.86356426))
            ThreePointArc((-6.280823768, -3.86356426), (-6.828250691, -4.070663142), (-7.404241277, -4.174591131))
            ThreePointArc((-7.404241277, -4.174591131), (-7.496330747, -4.006872263), (-7.584621721, -3.837123056))
            ThreePointArc((-7.584621721, -3.837123056), (-7.178205532, -3.415943684), (-6.701875002, -3.075832807))
            ThreePointArc((-6.701875002, -3.075832807), (-6.812687673, -2.82190763), (-6.913883496, -2.563999025))
            ThreePointArc((-6.913883496, -2.563999025), (-7.491194752, -2.660320865), (-8.076393185, -2.649881718))
            ThreePointArc((-8.076393185, -2.649881718), (-8.133992854, -2.467419757), (-8.187470914, -2.283707519))
            ThreePointArc((-8.187470914, -2.283707519), (-7.706695879, -1.949908855), (-7.173165566, -1.70926059))
            ThreePointArc((-7.173165566, -1.70926059), (-7.232310658, -1.438596035), (-7.281246559, -1.165900745))
            ThreePointArc((-7.281246559, -1.165900745), (-7.866256399, -1.14774395), (-8.438173832, -1.023338837))
            ThreePointArc((-8.438173832, -1.023338837), (-8.459070177, -0.833145693), (-8.475680191, -0.642530382))
            ThreePointArc((-8.475680191, -0.642530382), (-7.939022225, -0.408940123), (-7.3687954, -0.277002447))
            ThreePointArc((-7.3687954, -0.277002447), (-7.374, 0), (-7.3687954, 0.277002447))
            ThreePointArc((-7.3687954, 0.277002447), (-7.939022225, 0.408940123), (-8.475680191, 0.642530382))
            ThreePointArc((-8.475680191, 0.642530382), (-8.459070177, 0.833145693), (-8.438173832, 1.023338837))
            ThreePointArc((-8.438173832, 1.023338837), (-7.866256399, 1.14774395), (-7.281246559, 1.165900745))
            ThreePointArc((-7.281246559, 1.165900745), (-7.232310658, 1.438596035), (-7.173165566, 1.70926059))
            ThreePointArc((-7.173165566, 1.70926059), (-7.706695879, 1.949908855), (-8.187470914, 2.283707519))
            ThreePointArc((-8.187470914, 2.283707519), (-8.133992854, 2.467419757), (-8.076393185, 2.649881718))
            ThreePointArc((-8.076393185, 2.649881718), (-7.491194752, 2.660320865), (-6.913883496, 2.563999025))
            ThreePointArc((-6.913883496, 2.563999025), (-6.812687673, 2.82190763), (-6.701875002, 3.075832807))
            ThreePointArc((-6.701875002, 3.075832807), (-7.178205532, 3.415943684), (-7.584621721, 3.837123056))
            ThreePointArc((-7.584621721, 3.837123056), (-7.496330747, 4.006872263), (-7.404241277, 4.174591131))
            ThreePointArc((-7.404241277, 4.174591131), (-6.828250691, 4.070663142), (-6.280823768, 3.86356426))
            ThreePointArc((-6.280823768, 3.86356426), (-6.131256921, 4.096774898), (-5.97303514, 4.324202495))
            ThreePointArc((-5.97303514, 4.324202495), (-6.373860772, 4.750705713), (-6.690299769, 5.243080107))
            ThreePointArc((-6.690299769, 5.243080107), (-6.570588854, 5.392342915), (-6.447548529, 5.538873348))
            ThreePointArc((-6.447548529, 5.538873348), (-5.902900785, 5.324572118), (-5.406395505, 5.014654888))
            ThreePointArc((-5.406395505, 5.014654888), (-5.214205404, 5.214205404), (-5.014654888, 5.406395505))
            ThreePointArc((-5.014654888, 5.406395505), (-5.324572118, 5.902900785), (-5.538873348, 6.447548529))
            ThreePointArc((-5.538873348, 6.447548529), (-5.392342915, 6.570588854), (-5.243080107, 6.690299769))
            ThreePointArc((-5.243080107, 6.690299769), (-4.750705713, 6.373860772), (-4.324202495, 5.97303514))
            ThreePointArc((-4.324202495, 5.97303514), (-4.096774898, 6.131256921), (-3.86356426, 6.280823768))
            ThreePointArc((-3.86356426, 6.280823768), (-4.070663142, 6.828250691), (-4.174591131, 7.404241277))
            ThreePointArc((-4.174591131, 7.404241277), (-4.006872263, 7.496330747), (-3.837123056, 7.584621721))
            ThreePointArc((-3.837123056, 7.584621721), (-3.415943684, 7.178205532), (-3.075832807, 6.701875002))
            ThreePointArc((-3.075832807, 6.701875002), (-2.82190763, 6.812687673), (-2.563999025, 6.913883496))
            ThreePointArc((-2.563999025, 6.913883496), (-2.660320865, 7.491194752), (-2.649881718, 8.076393185))
            ThreePointArc((-2.649881718, 8.076393185), (-2.467419757, 8.133992854), (-2.283707519, 8.187470914))
            ThreePointArc((-2.283707519, 8.187470914), (-1.949908855, 7.706695879), (-1.70926059, 7.173165566))
            ThreePointArc((-1.70926059, 7.173165566), (-1.438596035, 7.232310658), (-1.165900745, 7.281246559))
            ThreePointArc((-1.165900745, 7.281246559), (-1.14774395, 7.866256399), (-1.023338837, 8.438173832))
            ThreePointArc((-1.023338837, 8.438173832), (-0.833145693, 8.459070177), (-0.642530382, 8.475680191))
            ThreePointArc((-0.642530382, 8.475680191), (-0.408940123, 7.939022225), (-0.277002447, 7.3687954))
            ThreePointArc((-0.277002447, 7.3687954), (-0.138525669, 7.372698735), (0, 7.374))
            Line((0, 7.374), (0, 1))
            ThreePointArc((0, 1), (-0.707106781, 0.707106781), (-1, 0))
            Line((-1, 0), (-1.25, 0))
        make_face()
    extrude(amount=-BOSS_EXTRUDE6_DEPTH)

    # Fillet1
    fillet1_edges = [part.edges().sort_by_distance(p)[0] for p in [
        (13, 0, 1.125),
        (13, 0.707106781, 0.707106781),
        (13, -3.633640599, 1.25),
    ]]
    fillet(fillet1_edges, radius=FILLET1_R - 0.0001)  # a hair under: the kernel refuses the full size


solid = part.part
